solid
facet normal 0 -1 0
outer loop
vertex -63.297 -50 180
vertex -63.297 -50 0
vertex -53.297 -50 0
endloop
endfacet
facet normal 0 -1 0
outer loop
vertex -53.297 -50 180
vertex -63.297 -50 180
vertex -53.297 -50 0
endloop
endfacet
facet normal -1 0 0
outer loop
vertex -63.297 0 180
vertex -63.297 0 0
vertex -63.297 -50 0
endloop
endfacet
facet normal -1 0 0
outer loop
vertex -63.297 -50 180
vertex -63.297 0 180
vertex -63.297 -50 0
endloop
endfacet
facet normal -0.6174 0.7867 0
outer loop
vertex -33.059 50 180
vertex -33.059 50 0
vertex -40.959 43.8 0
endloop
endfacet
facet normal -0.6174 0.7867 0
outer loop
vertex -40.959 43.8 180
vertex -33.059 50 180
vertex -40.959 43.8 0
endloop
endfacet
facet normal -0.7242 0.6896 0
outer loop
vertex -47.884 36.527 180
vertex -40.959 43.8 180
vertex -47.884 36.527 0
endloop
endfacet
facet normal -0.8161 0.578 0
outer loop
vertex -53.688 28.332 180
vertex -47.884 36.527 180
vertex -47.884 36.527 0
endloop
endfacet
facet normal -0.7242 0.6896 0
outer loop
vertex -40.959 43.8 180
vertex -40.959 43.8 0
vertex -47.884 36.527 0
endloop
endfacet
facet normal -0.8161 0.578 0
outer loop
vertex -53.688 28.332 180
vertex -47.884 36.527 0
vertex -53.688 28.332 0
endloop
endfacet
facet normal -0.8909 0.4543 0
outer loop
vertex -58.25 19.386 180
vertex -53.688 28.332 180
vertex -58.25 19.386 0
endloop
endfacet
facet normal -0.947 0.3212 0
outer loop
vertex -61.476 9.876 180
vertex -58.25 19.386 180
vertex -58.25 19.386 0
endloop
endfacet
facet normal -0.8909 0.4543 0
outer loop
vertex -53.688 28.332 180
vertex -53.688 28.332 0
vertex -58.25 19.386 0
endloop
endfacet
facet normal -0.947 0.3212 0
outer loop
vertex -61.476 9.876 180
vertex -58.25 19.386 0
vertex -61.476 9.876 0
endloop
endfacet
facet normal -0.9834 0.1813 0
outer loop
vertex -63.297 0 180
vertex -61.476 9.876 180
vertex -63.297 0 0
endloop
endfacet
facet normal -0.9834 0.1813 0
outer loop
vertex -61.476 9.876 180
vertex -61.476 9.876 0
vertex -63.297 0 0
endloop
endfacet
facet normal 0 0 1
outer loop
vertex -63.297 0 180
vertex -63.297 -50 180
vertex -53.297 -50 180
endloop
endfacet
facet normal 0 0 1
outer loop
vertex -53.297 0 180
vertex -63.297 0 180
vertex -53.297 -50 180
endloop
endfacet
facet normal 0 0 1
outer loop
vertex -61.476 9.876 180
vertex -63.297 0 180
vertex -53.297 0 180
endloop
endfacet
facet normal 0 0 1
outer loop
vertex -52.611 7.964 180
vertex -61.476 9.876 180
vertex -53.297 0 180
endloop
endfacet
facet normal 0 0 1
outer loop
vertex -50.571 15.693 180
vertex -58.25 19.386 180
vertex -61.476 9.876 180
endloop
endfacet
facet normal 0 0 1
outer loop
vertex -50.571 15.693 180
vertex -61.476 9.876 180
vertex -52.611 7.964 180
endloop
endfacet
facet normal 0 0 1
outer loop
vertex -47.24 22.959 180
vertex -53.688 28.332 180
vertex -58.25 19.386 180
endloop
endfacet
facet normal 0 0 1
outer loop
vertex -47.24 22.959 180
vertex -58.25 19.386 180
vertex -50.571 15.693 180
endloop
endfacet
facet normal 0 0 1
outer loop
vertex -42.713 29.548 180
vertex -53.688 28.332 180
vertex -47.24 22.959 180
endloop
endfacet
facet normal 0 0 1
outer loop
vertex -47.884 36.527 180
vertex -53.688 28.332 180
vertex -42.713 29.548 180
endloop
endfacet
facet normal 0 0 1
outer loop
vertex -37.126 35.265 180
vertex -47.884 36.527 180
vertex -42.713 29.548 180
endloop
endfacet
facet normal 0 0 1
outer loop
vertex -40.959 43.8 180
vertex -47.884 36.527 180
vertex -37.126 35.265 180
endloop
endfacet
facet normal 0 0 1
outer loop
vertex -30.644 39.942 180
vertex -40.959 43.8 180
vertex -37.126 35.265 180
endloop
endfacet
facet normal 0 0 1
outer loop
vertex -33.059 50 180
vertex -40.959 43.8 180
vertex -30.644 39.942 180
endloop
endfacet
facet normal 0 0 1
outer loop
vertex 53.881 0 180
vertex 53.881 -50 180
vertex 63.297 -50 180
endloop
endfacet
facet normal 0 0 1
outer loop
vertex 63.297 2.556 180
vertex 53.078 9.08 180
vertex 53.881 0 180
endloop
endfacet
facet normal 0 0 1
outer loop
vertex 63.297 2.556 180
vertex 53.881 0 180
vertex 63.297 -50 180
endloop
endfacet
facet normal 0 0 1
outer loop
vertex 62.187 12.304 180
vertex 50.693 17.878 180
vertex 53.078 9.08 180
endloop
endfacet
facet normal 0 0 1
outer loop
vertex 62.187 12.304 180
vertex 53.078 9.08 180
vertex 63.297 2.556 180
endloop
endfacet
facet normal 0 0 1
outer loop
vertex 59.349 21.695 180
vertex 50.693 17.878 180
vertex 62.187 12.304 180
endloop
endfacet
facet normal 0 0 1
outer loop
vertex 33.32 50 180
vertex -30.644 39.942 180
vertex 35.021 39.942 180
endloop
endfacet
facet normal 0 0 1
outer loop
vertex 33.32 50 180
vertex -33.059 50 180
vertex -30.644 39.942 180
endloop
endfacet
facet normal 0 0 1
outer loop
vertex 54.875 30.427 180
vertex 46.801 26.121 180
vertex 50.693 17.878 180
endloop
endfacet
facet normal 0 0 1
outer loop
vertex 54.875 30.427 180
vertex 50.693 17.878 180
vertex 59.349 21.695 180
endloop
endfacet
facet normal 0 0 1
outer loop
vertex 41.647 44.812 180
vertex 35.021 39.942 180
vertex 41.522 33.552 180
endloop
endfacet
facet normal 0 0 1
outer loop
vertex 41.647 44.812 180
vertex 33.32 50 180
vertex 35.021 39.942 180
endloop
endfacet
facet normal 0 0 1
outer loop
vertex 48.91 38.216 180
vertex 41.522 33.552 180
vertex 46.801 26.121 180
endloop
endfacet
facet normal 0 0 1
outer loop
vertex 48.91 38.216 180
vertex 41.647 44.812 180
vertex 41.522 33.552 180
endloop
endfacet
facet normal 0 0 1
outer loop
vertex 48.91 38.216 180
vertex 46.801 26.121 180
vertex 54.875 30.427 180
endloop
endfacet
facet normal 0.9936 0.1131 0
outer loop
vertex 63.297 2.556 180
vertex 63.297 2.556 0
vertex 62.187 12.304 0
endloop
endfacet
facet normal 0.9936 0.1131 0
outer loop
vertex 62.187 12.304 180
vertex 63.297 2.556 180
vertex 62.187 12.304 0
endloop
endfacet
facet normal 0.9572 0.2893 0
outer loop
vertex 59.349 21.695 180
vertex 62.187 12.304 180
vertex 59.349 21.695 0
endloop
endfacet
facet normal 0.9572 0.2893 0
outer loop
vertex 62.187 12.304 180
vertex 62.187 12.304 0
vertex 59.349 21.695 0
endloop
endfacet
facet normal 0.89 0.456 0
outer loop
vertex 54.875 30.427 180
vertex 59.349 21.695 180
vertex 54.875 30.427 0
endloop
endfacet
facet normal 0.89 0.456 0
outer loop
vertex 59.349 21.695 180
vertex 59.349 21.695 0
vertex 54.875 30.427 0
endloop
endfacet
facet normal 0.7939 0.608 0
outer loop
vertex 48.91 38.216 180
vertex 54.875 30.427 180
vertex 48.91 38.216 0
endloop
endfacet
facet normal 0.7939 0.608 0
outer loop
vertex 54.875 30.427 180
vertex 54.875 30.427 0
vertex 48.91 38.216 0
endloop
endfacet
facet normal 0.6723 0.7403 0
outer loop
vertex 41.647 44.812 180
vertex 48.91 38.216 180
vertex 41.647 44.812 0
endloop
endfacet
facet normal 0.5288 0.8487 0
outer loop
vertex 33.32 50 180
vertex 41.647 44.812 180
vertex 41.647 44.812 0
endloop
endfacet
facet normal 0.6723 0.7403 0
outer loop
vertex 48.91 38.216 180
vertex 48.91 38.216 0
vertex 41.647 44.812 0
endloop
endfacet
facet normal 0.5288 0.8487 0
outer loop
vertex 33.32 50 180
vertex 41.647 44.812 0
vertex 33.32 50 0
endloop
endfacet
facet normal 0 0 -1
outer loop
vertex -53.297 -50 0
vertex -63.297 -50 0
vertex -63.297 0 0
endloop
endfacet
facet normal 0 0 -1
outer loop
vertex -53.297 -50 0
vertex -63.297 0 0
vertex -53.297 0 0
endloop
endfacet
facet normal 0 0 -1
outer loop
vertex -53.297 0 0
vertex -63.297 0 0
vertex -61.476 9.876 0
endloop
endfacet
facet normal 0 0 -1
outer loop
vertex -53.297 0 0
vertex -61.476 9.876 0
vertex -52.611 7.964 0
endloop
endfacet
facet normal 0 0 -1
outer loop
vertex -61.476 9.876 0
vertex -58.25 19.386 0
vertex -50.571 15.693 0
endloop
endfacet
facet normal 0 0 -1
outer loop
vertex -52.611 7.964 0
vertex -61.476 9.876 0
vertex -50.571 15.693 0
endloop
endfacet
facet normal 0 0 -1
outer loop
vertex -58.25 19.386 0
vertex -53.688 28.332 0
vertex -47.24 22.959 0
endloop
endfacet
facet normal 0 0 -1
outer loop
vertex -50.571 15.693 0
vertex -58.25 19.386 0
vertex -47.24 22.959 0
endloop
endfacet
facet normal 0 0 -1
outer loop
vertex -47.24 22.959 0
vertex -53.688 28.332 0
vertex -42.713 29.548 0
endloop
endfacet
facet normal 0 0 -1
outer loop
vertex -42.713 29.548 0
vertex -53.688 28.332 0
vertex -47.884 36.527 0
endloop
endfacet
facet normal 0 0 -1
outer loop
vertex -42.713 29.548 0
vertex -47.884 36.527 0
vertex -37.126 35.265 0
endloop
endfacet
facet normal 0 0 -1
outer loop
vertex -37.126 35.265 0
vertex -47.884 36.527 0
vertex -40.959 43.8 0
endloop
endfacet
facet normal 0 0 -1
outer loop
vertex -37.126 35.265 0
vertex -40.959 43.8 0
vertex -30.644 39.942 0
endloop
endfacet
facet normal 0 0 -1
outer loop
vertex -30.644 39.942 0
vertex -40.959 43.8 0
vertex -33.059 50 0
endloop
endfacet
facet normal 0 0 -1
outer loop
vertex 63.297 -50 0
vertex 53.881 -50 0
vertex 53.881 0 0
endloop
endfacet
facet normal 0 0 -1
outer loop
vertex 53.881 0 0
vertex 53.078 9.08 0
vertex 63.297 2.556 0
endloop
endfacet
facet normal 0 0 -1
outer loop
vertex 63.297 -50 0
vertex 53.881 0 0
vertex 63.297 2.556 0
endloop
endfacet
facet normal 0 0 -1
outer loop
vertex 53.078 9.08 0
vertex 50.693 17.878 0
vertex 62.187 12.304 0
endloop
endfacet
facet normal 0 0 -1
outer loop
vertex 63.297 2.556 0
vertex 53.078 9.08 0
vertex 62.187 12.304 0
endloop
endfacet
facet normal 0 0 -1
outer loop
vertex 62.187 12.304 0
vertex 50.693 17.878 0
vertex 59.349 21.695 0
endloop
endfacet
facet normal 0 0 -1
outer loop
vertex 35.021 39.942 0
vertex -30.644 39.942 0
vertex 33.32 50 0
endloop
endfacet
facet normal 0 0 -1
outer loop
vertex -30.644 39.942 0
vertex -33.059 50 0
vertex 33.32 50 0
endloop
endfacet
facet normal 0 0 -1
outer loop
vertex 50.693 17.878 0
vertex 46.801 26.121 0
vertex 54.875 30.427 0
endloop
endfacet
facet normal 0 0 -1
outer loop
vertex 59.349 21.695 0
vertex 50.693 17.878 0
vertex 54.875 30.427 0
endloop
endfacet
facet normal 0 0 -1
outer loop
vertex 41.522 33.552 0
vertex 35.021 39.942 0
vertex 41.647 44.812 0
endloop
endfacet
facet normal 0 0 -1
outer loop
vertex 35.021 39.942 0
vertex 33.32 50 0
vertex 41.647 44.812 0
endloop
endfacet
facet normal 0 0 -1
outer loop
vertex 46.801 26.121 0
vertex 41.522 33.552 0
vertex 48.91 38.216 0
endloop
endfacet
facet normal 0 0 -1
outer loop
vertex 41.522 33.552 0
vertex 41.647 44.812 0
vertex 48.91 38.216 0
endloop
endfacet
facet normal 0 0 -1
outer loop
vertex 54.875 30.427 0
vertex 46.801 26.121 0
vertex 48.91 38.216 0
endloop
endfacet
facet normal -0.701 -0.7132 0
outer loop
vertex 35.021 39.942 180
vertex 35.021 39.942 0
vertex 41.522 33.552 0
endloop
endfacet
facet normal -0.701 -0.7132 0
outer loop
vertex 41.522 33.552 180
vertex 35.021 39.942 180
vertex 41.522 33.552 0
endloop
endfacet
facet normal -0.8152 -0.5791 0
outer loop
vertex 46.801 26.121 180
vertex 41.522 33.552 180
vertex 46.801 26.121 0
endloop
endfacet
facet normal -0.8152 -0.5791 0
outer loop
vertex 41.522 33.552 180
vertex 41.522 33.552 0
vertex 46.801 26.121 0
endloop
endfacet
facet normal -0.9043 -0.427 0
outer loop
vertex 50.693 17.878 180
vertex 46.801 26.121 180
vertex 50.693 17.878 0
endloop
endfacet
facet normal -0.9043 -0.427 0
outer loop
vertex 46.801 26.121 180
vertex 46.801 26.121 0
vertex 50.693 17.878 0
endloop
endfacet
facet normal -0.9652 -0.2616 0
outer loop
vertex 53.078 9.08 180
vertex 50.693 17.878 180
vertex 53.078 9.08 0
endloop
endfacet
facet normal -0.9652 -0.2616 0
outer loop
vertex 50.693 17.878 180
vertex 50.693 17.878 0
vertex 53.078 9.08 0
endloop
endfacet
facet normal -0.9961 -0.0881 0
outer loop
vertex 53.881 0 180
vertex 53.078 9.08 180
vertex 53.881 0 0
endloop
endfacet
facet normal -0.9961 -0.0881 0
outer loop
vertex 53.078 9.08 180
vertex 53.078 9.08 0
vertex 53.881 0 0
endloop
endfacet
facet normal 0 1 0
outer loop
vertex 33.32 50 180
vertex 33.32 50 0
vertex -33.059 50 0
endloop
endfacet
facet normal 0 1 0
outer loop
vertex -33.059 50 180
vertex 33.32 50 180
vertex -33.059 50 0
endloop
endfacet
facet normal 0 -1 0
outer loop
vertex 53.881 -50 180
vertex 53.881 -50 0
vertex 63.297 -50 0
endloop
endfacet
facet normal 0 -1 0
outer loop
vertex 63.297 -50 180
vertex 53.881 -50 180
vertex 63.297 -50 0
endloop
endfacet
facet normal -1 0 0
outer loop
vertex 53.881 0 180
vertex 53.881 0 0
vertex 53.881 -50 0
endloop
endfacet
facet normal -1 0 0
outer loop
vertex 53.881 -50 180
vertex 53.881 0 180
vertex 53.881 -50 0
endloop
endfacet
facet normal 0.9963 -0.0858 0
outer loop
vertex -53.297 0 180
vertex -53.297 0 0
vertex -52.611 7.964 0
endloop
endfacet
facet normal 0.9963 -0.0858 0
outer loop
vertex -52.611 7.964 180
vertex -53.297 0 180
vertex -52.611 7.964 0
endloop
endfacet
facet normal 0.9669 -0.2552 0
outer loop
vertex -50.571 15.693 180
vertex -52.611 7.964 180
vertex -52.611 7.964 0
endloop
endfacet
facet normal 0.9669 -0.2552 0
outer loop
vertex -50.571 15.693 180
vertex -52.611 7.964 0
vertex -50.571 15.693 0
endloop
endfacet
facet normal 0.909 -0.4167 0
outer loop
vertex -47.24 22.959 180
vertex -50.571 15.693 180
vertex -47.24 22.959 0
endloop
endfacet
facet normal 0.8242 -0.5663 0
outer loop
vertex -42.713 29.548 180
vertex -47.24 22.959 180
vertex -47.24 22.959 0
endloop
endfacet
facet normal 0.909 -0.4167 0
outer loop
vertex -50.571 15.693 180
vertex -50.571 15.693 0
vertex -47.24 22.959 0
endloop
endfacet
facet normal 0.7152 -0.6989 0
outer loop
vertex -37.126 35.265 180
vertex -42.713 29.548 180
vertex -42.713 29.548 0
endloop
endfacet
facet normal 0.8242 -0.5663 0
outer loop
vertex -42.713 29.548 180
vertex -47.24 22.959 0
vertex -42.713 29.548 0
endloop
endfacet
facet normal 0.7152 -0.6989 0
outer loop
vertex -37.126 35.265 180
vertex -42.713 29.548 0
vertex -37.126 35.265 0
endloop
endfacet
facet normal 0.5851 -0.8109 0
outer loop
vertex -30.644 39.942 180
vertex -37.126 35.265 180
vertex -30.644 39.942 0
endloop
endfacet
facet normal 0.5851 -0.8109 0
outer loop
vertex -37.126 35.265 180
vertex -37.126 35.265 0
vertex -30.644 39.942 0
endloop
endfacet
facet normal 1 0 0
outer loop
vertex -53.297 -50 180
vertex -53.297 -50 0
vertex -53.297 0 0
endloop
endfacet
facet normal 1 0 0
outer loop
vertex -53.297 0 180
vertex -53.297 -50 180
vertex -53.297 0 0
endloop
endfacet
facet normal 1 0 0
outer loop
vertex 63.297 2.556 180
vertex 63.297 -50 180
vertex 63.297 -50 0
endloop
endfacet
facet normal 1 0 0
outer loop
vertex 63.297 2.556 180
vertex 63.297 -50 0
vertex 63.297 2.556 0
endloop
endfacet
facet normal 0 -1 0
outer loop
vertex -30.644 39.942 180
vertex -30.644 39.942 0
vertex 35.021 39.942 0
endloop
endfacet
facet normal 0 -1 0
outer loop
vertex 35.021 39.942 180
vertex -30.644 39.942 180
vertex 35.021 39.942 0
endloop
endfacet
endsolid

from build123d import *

# Parameters (mm, degrees)
F1_DEPTH = 180


with BuildPart() as f1:
    # F0 (on Top) → F1 (new body)
    with BuildSketch(Plane.XY):
        with BuildLine():
            Line((53.880711, -50), (63.297123, -50))
            Line((63.297123, -50), (63.297123, 0))
            Line((63.297123, 0), (63.297123, 2.555883))
            ThreePointArc((63.297123, 2.555883), (54.874784, 30.426908), (33.319647, 50))
            Line((33.319647, 50), (-33.05907, 50))
            ThreePointArc((-33.05907, 50), (-53.687577, 28.331919), (-63.297123, 0))
            Line((-63.297123, 0), (-63.297123, -50))
            Line((-63.297123, -50), (-53.297123, -50))
            Line((-53.297123, -50), (-53.297123, 0))
            ThreePointArc((-53.297123, 0), (-47.239503, 22.95935), (-30.643604, 39.941771))
            Line((-30.643604, 39.941771), (35.021361, 39.941771))
            ThreePointArc((35.021361, 39.941771), (48.928843, 22.085177), (53.880711, 0))
            Line((53.880711, 0), (53.880711, -50))
        make_face()
    extrude(amount=F1_DEPTH)


solid = f1.part
